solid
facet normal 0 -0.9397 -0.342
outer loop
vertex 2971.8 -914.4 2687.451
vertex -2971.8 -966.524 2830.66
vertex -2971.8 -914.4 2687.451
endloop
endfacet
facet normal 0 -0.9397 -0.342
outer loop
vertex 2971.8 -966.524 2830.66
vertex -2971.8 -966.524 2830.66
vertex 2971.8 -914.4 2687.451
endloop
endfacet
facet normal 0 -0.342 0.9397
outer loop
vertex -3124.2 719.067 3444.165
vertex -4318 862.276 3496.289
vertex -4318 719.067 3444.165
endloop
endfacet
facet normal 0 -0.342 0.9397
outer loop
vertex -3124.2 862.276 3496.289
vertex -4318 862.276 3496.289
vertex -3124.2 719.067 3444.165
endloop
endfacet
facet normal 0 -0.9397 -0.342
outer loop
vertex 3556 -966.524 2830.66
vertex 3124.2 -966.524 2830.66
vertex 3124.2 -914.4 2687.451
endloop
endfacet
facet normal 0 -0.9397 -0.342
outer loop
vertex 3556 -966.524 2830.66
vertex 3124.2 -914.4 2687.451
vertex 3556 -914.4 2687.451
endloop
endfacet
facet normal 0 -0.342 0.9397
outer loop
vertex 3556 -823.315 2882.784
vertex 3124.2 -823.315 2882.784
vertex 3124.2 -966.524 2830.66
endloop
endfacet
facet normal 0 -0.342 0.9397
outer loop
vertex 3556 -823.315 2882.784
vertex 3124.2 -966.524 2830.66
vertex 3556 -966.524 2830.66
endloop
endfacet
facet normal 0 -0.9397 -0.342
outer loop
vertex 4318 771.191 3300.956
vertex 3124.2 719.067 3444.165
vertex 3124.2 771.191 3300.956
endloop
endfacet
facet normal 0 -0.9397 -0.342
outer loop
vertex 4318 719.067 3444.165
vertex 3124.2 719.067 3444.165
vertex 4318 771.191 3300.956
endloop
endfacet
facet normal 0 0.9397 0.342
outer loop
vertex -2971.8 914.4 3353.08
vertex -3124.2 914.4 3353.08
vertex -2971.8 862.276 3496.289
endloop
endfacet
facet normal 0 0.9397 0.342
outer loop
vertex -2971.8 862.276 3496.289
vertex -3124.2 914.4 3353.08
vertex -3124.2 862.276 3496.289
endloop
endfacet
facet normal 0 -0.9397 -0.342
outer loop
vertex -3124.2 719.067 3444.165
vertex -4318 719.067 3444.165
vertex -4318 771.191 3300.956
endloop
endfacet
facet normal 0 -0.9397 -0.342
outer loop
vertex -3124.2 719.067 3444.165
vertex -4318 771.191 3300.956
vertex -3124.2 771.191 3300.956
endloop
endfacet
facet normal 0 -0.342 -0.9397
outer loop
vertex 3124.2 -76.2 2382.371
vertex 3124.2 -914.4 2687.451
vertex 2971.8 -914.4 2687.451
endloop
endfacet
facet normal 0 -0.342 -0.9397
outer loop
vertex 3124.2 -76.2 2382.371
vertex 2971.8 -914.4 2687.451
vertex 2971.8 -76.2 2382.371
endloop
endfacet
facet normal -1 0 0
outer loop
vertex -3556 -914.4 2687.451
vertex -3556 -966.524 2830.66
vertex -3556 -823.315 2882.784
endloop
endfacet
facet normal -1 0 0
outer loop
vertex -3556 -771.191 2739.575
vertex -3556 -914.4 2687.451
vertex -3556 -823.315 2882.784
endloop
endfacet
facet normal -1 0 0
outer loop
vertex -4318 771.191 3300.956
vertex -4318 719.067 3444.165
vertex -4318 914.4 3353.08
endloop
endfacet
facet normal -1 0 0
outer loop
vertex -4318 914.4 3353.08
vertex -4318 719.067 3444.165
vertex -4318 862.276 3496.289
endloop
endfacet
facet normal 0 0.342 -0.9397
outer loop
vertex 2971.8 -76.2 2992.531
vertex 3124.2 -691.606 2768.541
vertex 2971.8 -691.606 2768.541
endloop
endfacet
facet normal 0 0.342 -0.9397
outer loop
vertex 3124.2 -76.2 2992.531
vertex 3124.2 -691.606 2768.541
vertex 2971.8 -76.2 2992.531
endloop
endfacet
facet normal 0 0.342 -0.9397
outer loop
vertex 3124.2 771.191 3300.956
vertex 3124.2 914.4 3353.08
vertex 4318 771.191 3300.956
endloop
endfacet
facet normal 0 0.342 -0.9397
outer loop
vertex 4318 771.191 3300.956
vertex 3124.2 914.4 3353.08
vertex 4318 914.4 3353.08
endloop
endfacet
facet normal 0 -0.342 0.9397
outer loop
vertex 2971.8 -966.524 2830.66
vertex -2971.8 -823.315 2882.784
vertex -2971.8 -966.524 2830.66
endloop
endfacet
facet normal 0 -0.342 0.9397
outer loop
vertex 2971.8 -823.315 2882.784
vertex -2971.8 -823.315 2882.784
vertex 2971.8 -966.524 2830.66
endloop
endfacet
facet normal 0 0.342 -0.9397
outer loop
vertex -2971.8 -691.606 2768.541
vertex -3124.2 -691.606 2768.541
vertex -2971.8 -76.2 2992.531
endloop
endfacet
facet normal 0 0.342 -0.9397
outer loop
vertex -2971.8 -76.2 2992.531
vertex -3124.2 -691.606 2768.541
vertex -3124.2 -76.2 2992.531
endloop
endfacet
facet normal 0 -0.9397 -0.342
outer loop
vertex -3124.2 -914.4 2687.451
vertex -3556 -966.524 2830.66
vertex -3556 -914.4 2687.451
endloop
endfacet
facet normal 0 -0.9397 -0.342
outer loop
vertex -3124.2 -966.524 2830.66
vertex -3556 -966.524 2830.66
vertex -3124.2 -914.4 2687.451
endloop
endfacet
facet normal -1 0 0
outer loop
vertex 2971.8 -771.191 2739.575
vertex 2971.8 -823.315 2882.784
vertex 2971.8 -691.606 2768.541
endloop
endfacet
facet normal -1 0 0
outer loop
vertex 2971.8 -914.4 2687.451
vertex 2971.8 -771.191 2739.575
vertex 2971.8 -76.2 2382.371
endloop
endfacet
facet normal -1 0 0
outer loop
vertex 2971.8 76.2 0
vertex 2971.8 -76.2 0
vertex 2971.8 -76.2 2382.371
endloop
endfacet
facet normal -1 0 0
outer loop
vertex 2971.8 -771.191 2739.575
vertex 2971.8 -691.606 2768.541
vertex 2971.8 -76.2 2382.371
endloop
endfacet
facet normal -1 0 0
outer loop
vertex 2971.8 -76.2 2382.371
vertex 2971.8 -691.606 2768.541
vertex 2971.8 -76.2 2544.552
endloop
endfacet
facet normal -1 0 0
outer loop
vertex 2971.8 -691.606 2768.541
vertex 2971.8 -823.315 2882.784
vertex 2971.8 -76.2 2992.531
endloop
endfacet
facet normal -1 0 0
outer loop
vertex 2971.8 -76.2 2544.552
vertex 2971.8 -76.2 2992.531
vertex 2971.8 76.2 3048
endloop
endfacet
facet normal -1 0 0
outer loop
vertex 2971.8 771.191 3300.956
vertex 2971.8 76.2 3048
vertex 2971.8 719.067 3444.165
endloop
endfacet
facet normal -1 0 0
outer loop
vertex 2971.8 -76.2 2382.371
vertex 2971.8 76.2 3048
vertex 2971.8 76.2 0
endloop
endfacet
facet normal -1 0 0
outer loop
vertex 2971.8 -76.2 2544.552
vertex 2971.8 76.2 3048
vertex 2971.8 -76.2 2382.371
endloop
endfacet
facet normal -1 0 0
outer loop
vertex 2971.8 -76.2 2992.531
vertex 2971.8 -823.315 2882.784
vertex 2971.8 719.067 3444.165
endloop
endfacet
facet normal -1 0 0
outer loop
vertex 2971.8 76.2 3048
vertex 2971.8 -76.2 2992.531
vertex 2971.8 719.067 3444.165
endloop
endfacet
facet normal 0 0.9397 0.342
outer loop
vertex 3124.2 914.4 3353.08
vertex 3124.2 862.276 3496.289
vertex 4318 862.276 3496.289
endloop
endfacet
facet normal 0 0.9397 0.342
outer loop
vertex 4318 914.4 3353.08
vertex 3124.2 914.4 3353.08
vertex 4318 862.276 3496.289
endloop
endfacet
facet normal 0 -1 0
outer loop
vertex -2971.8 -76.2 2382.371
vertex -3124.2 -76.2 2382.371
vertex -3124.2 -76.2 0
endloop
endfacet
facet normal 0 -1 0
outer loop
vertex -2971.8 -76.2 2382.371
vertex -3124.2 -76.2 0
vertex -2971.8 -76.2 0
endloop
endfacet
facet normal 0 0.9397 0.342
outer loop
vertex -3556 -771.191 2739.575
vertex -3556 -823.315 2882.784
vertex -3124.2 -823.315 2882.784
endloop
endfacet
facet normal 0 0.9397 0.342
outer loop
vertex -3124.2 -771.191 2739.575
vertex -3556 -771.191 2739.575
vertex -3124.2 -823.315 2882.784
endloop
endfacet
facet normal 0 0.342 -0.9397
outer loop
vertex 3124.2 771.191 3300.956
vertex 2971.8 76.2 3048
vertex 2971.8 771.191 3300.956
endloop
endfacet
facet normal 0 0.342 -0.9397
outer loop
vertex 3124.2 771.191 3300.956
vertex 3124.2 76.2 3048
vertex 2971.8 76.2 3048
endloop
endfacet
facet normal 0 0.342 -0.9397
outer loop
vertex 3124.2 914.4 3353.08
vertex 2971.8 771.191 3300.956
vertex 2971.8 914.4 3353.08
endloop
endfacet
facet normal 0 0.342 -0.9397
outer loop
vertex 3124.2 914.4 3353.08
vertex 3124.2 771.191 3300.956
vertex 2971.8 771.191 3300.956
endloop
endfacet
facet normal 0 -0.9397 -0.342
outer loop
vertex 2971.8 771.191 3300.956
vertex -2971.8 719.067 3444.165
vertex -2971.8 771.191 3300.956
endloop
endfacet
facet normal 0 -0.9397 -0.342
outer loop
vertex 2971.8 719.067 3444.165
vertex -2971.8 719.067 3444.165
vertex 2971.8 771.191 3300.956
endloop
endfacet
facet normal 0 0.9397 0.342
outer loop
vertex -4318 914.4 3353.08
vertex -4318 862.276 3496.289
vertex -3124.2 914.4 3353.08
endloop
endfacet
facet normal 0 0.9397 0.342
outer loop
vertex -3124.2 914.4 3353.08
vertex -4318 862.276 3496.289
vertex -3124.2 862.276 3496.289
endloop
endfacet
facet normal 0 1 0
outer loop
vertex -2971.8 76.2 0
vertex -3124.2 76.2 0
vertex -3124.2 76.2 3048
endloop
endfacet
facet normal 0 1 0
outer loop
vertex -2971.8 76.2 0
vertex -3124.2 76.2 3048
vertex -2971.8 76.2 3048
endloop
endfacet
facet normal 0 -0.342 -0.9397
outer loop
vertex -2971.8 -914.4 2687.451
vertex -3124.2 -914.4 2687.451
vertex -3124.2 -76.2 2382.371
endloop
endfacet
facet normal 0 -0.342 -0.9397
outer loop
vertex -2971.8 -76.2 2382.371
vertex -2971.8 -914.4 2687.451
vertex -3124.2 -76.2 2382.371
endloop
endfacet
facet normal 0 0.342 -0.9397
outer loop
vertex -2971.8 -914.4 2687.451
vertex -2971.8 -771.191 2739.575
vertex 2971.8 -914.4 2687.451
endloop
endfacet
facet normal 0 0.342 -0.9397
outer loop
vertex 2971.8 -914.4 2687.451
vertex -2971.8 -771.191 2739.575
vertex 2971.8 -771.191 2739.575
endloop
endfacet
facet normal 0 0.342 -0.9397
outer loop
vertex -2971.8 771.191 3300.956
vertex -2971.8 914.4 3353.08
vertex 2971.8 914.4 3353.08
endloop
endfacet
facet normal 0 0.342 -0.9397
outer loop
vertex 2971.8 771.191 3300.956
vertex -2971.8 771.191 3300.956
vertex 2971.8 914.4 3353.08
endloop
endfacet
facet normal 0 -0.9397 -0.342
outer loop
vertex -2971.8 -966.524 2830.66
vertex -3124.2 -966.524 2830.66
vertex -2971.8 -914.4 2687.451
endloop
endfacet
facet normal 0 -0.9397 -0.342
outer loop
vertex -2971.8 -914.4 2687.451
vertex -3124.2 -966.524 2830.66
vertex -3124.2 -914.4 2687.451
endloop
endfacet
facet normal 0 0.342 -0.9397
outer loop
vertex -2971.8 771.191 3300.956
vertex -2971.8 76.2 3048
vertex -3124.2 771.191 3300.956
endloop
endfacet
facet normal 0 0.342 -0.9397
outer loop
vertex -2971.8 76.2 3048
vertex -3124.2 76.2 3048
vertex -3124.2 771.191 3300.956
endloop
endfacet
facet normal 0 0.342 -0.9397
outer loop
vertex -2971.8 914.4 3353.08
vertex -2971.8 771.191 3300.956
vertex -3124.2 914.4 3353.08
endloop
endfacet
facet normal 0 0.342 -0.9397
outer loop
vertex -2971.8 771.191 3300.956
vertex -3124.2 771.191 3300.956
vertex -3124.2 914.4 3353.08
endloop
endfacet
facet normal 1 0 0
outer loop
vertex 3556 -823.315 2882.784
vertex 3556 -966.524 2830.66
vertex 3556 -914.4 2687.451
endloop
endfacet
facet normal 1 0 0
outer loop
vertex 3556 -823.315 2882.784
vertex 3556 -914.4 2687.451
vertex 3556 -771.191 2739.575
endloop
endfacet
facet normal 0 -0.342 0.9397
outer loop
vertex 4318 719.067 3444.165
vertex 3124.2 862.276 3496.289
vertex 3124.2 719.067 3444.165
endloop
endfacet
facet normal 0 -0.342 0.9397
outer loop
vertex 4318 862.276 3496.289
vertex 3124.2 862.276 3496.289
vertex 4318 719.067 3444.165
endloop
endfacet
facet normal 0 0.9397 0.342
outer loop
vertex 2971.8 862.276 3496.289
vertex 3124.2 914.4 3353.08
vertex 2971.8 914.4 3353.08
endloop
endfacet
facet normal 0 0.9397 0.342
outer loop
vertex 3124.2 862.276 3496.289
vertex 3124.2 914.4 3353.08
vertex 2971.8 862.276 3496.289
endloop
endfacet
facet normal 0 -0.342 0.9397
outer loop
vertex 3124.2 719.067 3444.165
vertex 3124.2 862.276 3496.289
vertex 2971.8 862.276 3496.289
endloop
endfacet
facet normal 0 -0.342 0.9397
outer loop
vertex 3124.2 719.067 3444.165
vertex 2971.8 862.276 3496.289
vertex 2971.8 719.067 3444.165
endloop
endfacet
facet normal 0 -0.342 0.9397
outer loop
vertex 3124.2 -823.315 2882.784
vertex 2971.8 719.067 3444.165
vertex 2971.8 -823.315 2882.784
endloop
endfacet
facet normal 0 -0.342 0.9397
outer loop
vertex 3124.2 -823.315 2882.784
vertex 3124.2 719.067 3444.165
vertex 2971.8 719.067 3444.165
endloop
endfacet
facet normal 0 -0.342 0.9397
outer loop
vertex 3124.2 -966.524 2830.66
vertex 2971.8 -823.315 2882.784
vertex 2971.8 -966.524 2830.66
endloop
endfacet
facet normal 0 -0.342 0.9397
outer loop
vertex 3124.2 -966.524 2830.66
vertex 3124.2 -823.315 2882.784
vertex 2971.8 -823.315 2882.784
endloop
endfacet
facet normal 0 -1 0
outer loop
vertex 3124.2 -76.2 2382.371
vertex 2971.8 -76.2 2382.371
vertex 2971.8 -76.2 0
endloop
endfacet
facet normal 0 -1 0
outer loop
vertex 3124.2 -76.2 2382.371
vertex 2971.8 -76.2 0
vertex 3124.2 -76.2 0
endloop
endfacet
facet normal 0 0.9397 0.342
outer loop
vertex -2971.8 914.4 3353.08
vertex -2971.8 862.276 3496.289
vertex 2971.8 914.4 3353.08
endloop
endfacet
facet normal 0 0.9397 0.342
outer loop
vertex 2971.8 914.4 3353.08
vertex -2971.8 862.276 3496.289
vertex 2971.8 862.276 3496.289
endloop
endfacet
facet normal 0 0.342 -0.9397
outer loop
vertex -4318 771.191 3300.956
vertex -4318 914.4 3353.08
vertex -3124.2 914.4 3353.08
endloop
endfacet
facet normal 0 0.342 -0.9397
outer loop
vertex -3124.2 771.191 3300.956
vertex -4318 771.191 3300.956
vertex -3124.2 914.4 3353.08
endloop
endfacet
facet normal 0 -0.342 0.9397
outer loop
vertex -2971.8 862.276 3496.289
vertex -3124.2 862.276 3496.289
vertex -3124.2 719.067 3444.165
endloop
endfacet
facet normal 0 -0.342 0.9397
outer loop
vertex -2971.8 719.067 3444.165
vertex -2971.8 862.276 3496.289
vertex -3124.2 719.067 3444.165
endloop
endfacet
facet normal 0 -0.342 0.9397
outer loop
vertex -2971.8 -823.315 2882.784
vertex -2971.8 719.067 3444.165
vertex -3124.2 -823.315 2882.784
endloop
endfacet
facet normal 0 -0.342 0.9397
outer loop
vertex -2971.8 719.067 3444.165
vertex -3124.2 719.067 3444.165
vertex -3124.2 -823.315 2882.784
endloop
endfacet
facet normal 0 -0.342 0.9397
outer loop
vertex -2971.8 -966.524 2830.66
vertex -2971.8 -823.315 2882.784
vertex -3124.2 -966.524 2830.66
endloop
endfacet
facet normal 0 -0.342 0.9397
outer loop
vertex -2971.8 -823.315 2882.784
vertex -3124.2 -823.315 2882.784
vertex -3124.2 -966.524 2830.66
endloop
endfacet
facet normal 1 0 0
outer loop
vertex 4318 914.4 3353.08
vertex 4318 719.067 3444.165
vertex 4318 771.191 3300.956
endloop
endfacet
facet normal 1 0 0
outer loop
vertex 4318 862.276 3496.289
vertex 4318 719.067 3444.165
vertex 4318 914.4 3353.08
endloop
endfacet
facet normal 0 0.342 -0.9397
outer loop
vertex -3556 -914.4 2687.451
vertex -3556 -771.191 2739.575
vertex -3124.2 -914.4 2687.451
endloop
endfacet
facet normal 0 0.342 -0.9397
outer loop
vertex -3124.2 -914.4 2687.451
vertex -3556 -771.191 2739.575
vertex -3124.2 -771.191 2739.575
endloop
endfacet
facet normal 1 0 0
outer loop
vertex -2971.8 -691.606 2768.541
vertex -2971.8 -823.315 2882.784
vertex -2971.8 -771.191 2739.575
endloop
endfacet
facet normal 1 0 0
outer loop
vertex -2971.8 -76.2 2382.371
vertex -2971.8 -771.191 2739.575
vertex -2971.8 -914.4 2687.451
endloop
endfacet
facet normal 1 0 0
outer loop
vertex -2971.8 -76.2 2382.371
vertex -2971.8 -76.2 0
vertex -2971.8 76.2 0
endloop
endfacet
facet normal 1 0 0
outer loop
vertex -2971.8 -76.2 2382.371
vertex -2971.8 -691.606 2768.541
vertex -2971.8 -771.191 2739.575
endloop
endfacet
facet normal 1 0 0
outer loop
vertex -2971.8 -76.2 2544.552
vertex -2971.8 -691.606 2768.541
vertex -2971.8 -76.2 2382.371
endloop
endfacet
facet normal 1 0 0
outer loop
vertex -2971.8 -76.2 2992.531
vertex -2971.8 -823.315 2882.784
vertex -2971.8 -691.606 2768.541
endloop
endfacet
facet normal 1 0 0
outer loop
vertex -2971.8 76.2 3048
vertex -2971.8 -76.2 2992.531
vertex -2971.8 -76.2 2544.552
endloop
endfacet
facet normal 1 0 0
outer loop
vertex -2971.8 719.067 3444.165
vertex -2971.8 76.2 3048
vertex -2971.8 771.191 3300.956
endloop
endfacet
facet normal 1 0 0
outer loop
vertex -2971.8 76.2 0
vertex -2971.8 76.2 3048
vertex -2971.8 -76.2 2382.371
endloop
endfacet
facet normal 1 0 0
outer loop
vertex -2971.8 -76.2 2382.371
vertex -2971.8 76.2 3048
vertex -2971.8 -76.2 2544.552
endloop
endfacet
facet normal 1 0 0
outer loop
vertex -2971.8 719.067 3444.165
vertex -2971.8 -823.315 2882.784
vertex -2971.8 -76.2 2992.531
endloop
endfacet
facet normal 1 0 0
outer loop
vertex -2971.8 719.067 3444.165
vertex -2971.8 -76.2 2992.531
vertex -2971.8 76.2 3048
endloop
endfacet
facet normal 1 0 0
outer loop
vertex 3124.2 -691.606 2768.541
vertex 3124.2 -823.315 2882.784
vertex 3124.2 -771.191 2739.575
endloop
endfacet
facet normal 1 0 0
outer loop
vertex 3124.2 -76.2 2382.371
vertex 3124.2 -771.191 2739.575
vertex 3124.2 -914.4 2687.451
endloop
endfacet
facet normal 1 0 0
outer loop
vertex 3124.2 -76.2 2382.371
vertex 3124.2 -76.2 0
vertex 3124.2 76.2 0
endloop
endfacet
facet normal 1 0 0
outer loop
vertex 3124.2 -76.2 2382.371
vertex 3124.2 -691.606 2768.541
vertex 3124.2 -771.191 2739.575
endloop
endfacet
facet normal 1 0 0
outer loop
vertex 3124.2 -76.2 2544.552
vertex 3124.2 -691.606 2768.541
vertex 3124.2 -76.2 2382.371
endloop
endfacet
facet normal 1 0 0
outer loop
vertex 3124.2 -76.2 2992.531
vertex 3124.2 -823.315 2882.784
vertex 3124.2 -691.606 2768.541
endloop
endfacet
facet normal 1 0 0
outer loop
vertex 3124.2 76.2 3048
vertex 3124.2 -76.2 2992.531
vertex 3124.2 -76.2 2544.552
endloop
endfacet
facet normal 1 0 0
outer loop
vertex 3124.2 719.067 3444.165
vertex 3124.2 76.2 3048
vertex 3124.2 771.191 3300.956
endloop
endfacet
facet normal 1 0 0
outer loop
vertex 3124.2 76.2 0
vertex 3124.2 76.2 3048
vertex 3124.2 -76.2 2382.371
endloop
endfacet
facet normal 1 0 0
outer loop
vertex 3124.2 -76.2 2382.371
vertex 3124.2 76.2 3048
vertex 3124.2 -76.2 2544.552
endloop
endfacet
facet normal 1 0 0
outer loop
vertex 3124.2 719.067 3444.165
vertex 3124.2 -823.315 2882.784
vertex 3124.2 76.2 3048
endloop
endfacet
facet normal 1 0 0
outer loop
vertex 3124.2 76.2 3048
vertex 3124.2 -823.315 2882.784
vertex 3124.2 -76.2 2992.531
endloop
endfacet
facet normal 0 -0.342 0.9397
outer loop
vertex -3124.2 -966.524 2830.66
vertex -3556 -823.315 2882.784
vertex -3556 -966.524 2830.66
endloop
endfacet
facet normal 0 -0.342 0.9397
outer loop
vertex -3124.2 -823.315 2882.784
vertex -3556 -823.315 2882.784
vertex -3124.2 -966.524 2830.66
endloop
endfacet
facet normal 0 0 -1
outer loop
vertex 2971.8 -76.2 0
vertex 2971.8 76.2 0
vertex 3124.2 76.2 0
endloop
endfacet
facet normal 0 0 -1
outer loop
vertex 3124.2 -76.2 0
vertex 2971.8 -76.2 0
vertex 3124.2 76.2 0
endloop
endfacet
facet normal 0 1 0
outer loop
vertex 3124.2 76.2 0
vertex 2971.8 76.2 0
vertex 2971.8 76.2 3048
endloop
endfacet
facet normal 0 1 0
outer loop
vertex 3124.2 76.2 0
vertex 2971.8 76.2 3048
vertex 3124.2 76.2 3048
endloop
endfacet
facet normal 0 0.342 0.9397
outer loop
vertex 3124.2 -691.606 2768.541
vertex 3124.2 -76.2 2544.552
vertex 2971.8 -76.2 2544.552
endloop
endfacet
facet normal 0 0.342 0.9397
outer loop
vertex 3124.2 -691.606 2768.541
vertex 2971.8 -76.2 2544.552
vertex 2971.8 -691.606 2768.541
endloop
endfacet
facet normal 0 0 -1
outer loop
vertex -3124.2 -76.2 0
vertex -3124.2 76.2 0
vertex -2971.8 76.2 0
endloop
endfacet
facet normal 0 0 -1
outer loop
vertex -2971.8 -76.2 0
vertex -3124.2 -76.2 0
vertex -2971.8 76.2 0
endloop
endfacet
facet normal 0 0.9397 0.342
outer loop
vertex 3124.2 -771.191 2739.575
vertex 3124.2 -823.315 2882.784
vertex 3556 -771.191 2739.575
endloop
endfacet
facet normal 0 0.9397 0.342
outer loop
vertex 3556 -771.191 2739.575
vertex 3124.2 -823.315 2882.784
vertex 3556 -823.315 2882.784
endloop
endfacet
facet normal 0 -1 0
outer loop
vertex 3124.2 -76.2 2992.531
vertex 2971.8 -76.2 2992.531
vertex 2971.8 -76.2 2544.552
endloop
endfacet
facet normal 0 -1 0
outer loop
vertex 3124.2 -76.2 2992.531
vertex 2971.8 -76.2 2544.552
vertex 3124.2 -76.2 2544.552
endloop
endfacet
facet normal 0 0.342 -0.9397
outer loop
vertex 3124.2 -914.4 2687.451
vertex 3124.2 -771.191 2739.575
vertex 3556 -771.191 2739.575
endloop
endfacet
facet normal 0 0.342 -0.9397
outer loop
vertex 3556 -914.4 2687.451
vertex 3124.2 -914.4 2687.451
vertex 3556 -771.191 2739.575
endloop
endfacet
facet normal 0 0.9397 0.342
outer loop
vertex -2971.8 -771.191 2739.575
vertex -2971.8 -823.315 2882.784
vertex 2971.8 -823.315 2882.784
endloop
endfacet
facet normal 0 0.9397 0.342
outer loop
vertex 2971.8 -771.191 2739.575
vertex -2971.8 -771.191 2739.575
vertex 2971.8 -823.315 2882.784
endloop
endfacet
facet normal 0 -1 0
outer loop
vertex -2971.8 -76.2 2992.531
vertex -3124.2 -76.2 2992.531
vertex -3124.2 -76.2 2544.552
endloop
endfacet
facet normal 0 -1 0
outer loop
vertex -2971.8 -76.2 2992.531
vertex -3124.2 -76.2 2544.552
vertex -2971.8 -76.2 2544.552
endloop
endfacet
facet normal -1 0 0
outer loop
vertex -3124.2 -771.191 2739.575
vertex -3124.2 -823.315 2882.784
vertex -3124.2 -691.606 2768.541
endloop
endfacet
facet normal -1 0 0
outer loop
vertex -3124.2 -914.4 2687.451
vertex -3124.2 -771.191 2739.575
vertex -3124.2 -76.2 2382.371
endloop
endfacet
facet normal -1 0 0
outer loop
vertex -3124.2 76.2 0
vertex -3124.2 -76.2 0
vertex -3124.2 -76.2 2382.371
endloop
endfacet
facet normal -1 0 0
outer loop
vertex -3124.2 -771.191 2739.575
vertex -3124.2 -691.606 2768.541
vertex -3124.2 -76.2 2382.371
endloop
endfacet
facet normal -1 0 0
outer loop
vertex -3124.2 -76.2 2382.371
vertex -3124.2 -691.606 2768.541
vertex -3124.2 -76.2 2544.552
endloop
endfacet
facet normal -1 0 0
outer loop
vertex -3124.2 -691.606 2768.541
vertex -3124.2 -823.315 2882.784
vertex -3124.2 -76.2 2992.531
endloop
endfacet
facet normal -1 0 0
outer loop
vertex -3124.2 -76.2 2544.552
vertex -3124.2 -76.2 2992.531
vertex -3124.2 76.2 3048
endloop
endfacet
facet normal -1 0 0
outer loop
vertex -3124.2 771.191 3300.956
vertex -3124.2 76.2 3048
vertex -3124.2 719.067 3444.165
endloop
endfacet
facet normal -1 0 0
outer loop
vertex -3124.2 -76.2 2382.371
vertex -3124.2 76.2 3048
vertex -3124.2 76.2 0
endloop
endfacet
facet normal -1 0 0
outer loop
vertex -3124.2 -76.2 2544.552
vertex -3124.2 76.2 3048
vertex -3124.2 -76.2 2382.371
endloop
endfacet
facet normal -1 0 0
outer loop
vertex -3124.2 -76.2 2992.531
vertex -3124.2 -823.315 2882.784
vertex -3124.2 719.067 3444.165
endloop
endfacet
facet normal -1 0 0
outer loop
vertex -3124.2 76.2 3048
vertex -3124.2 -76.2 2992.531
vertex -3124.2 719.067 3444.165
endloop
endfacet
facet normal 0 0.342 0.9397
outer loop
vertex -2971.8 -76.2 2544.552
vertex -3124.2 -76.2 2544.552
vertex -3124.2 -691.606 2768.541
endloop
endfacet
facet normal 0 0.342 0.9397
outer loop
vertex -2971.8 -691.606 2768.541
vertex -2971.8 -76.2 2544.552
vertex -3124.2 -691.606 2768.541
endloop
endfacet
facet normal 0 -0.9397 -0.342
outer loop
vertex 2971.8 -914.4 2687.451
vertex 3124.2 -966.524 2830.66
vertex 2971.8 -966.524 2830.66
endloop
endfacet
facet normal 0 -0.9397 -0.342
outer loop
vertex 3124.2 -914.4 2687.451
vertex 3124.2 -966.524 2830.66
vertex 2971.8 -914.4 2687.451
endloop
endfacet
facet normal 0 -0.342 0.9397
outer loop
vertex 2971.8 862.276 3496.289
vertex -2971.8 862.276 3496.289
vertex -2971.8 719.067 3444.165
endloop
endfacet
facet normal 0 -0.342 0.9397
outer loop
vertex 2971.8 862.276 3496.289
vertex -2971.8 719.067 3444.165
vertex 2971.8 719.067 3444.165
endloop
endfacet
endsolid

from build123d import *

# Parameters (mm, degrees)
F0_W      = 152.4
F0_H      = 152.4
F1_DEPTH  = 3048
F2_SIZE2  = 55.469054
F2_SIZE   = 152.39999
F3_SIZE2  = 55.469054
F3_SIZE   = 152.39999
F5_DEPTH  = 152.4
F7_W      = 7112
F7_H      = 152.4
F7_W_2    = 8636
F8_DEPTH  = 152.4
F11_DEPTH = 152.4


# Not quite as in the source:
# - a fillet or chamfer is up to 0.001 mm smaller than in the source, because OpenCascade refuses the exact size


with BuildPart() as f1:
    # F0 (on Top) → F1 (new body)
    with BuildSketch(Plane.XY):
        with Locations((-3048, 0)):
            Rectangle(F0_W, F0_H)
    extrude(amount=F1_DEPTH)

    # F3 (size 152.4 and 55.4690637022 in the source; OpenCascade refuses exactly that, so slightly less here)
    f3_edges = [f1.edges().sort_by_distance(p)[0] for p in [
        (-3048, -76.2, 3048),
    ]]
    f3_side = f1.faces().sort_by_distance((-3048, 0, 3048))[0]
    chamfer(f3_edges, length=F3_SIZE, length2=F3_SIZE2, reference=f3_side)

    # F6: F1b across plane


with BuildPart() as f1b:
    # F0 (on Top) → F1, piece 2 (new body)
    with BuildSketch(Plane.XY):
        with Locations((3048, 0)):
            Rectangle(F0_W, F0_H)
    extrude(amount=F1_DEPTH)

    # F2 (size 152.4 and 55.4690637022 in the source; OpenCascade refuses exactly that, so slightly less here)
    f2_edges = [f1b.edges().sort_by_distance(p)[0] for p in [
        (3048, -76.2, 3048),
    ]]
    f2_side = f1b.faces().sort_by_distance((3048, 0, 3048))[0]
    chamfer(f2_edges, length=F2_SIZE, length2=F2_SIZE2, reference=f2_side)

    # F4 (on face) → F5 (join)
    with BuildSketch(Plane.YZ.offset(3124.2)):
        Polygon((-966.5238698428, 2830.6602413437), (-914.4, 2687.4510859359), (-76.1999968818, 2992.5309374328), (76.1999955849, 3047.999998393), (914.4, 3353.0798503619), (862.2761301572, 3496.2890057697), align=None)
    extrude(amount=-F5_DEPTH)


with BuildPart() as f1_1:
    add(f1.part)
    add(f1b.part.mirror(Plane.YZ))


    add(f1b.part)  # F8 merges F1b
    # F7 (on face) → F8 (join)
    with BuildSketch(Plane(origin=(0, -1022.818480288, 2810.170678792), x_dir=(1, 0, 0), z_dir=(0, -0.3420201433, 0.9396926208))):
        with Locations((0, 136.1074731459)):
            Rectangle(F7_W, F7_H)
        with Locations((0, 1929.8757834498)):
            Rectangle(F7_W_2, F7_H)
    extrude(amount=-F8_DEPTH)

    # F9: union 

    # F10 (on face) → F11 (join)
    with BuildSketch(Plane.YZ.offset(3124.2)):
        Polygon((-771.1908445922, 2739.5749557787), (-914.4, 2687.4510859359), (-76.2, 2382.371235574), (-76.2, 2544.5519280993), (-691.6061047076, 2768.5414321986), align=None)
    extrude(amount=-F11_DEPTH)

    # F12: F1 across plane


with BuildPart() as f1_2:
    add(f1_1.part)
    add(f1_1.part.mirror(Plane.YZ))


solid = f1_2.part
